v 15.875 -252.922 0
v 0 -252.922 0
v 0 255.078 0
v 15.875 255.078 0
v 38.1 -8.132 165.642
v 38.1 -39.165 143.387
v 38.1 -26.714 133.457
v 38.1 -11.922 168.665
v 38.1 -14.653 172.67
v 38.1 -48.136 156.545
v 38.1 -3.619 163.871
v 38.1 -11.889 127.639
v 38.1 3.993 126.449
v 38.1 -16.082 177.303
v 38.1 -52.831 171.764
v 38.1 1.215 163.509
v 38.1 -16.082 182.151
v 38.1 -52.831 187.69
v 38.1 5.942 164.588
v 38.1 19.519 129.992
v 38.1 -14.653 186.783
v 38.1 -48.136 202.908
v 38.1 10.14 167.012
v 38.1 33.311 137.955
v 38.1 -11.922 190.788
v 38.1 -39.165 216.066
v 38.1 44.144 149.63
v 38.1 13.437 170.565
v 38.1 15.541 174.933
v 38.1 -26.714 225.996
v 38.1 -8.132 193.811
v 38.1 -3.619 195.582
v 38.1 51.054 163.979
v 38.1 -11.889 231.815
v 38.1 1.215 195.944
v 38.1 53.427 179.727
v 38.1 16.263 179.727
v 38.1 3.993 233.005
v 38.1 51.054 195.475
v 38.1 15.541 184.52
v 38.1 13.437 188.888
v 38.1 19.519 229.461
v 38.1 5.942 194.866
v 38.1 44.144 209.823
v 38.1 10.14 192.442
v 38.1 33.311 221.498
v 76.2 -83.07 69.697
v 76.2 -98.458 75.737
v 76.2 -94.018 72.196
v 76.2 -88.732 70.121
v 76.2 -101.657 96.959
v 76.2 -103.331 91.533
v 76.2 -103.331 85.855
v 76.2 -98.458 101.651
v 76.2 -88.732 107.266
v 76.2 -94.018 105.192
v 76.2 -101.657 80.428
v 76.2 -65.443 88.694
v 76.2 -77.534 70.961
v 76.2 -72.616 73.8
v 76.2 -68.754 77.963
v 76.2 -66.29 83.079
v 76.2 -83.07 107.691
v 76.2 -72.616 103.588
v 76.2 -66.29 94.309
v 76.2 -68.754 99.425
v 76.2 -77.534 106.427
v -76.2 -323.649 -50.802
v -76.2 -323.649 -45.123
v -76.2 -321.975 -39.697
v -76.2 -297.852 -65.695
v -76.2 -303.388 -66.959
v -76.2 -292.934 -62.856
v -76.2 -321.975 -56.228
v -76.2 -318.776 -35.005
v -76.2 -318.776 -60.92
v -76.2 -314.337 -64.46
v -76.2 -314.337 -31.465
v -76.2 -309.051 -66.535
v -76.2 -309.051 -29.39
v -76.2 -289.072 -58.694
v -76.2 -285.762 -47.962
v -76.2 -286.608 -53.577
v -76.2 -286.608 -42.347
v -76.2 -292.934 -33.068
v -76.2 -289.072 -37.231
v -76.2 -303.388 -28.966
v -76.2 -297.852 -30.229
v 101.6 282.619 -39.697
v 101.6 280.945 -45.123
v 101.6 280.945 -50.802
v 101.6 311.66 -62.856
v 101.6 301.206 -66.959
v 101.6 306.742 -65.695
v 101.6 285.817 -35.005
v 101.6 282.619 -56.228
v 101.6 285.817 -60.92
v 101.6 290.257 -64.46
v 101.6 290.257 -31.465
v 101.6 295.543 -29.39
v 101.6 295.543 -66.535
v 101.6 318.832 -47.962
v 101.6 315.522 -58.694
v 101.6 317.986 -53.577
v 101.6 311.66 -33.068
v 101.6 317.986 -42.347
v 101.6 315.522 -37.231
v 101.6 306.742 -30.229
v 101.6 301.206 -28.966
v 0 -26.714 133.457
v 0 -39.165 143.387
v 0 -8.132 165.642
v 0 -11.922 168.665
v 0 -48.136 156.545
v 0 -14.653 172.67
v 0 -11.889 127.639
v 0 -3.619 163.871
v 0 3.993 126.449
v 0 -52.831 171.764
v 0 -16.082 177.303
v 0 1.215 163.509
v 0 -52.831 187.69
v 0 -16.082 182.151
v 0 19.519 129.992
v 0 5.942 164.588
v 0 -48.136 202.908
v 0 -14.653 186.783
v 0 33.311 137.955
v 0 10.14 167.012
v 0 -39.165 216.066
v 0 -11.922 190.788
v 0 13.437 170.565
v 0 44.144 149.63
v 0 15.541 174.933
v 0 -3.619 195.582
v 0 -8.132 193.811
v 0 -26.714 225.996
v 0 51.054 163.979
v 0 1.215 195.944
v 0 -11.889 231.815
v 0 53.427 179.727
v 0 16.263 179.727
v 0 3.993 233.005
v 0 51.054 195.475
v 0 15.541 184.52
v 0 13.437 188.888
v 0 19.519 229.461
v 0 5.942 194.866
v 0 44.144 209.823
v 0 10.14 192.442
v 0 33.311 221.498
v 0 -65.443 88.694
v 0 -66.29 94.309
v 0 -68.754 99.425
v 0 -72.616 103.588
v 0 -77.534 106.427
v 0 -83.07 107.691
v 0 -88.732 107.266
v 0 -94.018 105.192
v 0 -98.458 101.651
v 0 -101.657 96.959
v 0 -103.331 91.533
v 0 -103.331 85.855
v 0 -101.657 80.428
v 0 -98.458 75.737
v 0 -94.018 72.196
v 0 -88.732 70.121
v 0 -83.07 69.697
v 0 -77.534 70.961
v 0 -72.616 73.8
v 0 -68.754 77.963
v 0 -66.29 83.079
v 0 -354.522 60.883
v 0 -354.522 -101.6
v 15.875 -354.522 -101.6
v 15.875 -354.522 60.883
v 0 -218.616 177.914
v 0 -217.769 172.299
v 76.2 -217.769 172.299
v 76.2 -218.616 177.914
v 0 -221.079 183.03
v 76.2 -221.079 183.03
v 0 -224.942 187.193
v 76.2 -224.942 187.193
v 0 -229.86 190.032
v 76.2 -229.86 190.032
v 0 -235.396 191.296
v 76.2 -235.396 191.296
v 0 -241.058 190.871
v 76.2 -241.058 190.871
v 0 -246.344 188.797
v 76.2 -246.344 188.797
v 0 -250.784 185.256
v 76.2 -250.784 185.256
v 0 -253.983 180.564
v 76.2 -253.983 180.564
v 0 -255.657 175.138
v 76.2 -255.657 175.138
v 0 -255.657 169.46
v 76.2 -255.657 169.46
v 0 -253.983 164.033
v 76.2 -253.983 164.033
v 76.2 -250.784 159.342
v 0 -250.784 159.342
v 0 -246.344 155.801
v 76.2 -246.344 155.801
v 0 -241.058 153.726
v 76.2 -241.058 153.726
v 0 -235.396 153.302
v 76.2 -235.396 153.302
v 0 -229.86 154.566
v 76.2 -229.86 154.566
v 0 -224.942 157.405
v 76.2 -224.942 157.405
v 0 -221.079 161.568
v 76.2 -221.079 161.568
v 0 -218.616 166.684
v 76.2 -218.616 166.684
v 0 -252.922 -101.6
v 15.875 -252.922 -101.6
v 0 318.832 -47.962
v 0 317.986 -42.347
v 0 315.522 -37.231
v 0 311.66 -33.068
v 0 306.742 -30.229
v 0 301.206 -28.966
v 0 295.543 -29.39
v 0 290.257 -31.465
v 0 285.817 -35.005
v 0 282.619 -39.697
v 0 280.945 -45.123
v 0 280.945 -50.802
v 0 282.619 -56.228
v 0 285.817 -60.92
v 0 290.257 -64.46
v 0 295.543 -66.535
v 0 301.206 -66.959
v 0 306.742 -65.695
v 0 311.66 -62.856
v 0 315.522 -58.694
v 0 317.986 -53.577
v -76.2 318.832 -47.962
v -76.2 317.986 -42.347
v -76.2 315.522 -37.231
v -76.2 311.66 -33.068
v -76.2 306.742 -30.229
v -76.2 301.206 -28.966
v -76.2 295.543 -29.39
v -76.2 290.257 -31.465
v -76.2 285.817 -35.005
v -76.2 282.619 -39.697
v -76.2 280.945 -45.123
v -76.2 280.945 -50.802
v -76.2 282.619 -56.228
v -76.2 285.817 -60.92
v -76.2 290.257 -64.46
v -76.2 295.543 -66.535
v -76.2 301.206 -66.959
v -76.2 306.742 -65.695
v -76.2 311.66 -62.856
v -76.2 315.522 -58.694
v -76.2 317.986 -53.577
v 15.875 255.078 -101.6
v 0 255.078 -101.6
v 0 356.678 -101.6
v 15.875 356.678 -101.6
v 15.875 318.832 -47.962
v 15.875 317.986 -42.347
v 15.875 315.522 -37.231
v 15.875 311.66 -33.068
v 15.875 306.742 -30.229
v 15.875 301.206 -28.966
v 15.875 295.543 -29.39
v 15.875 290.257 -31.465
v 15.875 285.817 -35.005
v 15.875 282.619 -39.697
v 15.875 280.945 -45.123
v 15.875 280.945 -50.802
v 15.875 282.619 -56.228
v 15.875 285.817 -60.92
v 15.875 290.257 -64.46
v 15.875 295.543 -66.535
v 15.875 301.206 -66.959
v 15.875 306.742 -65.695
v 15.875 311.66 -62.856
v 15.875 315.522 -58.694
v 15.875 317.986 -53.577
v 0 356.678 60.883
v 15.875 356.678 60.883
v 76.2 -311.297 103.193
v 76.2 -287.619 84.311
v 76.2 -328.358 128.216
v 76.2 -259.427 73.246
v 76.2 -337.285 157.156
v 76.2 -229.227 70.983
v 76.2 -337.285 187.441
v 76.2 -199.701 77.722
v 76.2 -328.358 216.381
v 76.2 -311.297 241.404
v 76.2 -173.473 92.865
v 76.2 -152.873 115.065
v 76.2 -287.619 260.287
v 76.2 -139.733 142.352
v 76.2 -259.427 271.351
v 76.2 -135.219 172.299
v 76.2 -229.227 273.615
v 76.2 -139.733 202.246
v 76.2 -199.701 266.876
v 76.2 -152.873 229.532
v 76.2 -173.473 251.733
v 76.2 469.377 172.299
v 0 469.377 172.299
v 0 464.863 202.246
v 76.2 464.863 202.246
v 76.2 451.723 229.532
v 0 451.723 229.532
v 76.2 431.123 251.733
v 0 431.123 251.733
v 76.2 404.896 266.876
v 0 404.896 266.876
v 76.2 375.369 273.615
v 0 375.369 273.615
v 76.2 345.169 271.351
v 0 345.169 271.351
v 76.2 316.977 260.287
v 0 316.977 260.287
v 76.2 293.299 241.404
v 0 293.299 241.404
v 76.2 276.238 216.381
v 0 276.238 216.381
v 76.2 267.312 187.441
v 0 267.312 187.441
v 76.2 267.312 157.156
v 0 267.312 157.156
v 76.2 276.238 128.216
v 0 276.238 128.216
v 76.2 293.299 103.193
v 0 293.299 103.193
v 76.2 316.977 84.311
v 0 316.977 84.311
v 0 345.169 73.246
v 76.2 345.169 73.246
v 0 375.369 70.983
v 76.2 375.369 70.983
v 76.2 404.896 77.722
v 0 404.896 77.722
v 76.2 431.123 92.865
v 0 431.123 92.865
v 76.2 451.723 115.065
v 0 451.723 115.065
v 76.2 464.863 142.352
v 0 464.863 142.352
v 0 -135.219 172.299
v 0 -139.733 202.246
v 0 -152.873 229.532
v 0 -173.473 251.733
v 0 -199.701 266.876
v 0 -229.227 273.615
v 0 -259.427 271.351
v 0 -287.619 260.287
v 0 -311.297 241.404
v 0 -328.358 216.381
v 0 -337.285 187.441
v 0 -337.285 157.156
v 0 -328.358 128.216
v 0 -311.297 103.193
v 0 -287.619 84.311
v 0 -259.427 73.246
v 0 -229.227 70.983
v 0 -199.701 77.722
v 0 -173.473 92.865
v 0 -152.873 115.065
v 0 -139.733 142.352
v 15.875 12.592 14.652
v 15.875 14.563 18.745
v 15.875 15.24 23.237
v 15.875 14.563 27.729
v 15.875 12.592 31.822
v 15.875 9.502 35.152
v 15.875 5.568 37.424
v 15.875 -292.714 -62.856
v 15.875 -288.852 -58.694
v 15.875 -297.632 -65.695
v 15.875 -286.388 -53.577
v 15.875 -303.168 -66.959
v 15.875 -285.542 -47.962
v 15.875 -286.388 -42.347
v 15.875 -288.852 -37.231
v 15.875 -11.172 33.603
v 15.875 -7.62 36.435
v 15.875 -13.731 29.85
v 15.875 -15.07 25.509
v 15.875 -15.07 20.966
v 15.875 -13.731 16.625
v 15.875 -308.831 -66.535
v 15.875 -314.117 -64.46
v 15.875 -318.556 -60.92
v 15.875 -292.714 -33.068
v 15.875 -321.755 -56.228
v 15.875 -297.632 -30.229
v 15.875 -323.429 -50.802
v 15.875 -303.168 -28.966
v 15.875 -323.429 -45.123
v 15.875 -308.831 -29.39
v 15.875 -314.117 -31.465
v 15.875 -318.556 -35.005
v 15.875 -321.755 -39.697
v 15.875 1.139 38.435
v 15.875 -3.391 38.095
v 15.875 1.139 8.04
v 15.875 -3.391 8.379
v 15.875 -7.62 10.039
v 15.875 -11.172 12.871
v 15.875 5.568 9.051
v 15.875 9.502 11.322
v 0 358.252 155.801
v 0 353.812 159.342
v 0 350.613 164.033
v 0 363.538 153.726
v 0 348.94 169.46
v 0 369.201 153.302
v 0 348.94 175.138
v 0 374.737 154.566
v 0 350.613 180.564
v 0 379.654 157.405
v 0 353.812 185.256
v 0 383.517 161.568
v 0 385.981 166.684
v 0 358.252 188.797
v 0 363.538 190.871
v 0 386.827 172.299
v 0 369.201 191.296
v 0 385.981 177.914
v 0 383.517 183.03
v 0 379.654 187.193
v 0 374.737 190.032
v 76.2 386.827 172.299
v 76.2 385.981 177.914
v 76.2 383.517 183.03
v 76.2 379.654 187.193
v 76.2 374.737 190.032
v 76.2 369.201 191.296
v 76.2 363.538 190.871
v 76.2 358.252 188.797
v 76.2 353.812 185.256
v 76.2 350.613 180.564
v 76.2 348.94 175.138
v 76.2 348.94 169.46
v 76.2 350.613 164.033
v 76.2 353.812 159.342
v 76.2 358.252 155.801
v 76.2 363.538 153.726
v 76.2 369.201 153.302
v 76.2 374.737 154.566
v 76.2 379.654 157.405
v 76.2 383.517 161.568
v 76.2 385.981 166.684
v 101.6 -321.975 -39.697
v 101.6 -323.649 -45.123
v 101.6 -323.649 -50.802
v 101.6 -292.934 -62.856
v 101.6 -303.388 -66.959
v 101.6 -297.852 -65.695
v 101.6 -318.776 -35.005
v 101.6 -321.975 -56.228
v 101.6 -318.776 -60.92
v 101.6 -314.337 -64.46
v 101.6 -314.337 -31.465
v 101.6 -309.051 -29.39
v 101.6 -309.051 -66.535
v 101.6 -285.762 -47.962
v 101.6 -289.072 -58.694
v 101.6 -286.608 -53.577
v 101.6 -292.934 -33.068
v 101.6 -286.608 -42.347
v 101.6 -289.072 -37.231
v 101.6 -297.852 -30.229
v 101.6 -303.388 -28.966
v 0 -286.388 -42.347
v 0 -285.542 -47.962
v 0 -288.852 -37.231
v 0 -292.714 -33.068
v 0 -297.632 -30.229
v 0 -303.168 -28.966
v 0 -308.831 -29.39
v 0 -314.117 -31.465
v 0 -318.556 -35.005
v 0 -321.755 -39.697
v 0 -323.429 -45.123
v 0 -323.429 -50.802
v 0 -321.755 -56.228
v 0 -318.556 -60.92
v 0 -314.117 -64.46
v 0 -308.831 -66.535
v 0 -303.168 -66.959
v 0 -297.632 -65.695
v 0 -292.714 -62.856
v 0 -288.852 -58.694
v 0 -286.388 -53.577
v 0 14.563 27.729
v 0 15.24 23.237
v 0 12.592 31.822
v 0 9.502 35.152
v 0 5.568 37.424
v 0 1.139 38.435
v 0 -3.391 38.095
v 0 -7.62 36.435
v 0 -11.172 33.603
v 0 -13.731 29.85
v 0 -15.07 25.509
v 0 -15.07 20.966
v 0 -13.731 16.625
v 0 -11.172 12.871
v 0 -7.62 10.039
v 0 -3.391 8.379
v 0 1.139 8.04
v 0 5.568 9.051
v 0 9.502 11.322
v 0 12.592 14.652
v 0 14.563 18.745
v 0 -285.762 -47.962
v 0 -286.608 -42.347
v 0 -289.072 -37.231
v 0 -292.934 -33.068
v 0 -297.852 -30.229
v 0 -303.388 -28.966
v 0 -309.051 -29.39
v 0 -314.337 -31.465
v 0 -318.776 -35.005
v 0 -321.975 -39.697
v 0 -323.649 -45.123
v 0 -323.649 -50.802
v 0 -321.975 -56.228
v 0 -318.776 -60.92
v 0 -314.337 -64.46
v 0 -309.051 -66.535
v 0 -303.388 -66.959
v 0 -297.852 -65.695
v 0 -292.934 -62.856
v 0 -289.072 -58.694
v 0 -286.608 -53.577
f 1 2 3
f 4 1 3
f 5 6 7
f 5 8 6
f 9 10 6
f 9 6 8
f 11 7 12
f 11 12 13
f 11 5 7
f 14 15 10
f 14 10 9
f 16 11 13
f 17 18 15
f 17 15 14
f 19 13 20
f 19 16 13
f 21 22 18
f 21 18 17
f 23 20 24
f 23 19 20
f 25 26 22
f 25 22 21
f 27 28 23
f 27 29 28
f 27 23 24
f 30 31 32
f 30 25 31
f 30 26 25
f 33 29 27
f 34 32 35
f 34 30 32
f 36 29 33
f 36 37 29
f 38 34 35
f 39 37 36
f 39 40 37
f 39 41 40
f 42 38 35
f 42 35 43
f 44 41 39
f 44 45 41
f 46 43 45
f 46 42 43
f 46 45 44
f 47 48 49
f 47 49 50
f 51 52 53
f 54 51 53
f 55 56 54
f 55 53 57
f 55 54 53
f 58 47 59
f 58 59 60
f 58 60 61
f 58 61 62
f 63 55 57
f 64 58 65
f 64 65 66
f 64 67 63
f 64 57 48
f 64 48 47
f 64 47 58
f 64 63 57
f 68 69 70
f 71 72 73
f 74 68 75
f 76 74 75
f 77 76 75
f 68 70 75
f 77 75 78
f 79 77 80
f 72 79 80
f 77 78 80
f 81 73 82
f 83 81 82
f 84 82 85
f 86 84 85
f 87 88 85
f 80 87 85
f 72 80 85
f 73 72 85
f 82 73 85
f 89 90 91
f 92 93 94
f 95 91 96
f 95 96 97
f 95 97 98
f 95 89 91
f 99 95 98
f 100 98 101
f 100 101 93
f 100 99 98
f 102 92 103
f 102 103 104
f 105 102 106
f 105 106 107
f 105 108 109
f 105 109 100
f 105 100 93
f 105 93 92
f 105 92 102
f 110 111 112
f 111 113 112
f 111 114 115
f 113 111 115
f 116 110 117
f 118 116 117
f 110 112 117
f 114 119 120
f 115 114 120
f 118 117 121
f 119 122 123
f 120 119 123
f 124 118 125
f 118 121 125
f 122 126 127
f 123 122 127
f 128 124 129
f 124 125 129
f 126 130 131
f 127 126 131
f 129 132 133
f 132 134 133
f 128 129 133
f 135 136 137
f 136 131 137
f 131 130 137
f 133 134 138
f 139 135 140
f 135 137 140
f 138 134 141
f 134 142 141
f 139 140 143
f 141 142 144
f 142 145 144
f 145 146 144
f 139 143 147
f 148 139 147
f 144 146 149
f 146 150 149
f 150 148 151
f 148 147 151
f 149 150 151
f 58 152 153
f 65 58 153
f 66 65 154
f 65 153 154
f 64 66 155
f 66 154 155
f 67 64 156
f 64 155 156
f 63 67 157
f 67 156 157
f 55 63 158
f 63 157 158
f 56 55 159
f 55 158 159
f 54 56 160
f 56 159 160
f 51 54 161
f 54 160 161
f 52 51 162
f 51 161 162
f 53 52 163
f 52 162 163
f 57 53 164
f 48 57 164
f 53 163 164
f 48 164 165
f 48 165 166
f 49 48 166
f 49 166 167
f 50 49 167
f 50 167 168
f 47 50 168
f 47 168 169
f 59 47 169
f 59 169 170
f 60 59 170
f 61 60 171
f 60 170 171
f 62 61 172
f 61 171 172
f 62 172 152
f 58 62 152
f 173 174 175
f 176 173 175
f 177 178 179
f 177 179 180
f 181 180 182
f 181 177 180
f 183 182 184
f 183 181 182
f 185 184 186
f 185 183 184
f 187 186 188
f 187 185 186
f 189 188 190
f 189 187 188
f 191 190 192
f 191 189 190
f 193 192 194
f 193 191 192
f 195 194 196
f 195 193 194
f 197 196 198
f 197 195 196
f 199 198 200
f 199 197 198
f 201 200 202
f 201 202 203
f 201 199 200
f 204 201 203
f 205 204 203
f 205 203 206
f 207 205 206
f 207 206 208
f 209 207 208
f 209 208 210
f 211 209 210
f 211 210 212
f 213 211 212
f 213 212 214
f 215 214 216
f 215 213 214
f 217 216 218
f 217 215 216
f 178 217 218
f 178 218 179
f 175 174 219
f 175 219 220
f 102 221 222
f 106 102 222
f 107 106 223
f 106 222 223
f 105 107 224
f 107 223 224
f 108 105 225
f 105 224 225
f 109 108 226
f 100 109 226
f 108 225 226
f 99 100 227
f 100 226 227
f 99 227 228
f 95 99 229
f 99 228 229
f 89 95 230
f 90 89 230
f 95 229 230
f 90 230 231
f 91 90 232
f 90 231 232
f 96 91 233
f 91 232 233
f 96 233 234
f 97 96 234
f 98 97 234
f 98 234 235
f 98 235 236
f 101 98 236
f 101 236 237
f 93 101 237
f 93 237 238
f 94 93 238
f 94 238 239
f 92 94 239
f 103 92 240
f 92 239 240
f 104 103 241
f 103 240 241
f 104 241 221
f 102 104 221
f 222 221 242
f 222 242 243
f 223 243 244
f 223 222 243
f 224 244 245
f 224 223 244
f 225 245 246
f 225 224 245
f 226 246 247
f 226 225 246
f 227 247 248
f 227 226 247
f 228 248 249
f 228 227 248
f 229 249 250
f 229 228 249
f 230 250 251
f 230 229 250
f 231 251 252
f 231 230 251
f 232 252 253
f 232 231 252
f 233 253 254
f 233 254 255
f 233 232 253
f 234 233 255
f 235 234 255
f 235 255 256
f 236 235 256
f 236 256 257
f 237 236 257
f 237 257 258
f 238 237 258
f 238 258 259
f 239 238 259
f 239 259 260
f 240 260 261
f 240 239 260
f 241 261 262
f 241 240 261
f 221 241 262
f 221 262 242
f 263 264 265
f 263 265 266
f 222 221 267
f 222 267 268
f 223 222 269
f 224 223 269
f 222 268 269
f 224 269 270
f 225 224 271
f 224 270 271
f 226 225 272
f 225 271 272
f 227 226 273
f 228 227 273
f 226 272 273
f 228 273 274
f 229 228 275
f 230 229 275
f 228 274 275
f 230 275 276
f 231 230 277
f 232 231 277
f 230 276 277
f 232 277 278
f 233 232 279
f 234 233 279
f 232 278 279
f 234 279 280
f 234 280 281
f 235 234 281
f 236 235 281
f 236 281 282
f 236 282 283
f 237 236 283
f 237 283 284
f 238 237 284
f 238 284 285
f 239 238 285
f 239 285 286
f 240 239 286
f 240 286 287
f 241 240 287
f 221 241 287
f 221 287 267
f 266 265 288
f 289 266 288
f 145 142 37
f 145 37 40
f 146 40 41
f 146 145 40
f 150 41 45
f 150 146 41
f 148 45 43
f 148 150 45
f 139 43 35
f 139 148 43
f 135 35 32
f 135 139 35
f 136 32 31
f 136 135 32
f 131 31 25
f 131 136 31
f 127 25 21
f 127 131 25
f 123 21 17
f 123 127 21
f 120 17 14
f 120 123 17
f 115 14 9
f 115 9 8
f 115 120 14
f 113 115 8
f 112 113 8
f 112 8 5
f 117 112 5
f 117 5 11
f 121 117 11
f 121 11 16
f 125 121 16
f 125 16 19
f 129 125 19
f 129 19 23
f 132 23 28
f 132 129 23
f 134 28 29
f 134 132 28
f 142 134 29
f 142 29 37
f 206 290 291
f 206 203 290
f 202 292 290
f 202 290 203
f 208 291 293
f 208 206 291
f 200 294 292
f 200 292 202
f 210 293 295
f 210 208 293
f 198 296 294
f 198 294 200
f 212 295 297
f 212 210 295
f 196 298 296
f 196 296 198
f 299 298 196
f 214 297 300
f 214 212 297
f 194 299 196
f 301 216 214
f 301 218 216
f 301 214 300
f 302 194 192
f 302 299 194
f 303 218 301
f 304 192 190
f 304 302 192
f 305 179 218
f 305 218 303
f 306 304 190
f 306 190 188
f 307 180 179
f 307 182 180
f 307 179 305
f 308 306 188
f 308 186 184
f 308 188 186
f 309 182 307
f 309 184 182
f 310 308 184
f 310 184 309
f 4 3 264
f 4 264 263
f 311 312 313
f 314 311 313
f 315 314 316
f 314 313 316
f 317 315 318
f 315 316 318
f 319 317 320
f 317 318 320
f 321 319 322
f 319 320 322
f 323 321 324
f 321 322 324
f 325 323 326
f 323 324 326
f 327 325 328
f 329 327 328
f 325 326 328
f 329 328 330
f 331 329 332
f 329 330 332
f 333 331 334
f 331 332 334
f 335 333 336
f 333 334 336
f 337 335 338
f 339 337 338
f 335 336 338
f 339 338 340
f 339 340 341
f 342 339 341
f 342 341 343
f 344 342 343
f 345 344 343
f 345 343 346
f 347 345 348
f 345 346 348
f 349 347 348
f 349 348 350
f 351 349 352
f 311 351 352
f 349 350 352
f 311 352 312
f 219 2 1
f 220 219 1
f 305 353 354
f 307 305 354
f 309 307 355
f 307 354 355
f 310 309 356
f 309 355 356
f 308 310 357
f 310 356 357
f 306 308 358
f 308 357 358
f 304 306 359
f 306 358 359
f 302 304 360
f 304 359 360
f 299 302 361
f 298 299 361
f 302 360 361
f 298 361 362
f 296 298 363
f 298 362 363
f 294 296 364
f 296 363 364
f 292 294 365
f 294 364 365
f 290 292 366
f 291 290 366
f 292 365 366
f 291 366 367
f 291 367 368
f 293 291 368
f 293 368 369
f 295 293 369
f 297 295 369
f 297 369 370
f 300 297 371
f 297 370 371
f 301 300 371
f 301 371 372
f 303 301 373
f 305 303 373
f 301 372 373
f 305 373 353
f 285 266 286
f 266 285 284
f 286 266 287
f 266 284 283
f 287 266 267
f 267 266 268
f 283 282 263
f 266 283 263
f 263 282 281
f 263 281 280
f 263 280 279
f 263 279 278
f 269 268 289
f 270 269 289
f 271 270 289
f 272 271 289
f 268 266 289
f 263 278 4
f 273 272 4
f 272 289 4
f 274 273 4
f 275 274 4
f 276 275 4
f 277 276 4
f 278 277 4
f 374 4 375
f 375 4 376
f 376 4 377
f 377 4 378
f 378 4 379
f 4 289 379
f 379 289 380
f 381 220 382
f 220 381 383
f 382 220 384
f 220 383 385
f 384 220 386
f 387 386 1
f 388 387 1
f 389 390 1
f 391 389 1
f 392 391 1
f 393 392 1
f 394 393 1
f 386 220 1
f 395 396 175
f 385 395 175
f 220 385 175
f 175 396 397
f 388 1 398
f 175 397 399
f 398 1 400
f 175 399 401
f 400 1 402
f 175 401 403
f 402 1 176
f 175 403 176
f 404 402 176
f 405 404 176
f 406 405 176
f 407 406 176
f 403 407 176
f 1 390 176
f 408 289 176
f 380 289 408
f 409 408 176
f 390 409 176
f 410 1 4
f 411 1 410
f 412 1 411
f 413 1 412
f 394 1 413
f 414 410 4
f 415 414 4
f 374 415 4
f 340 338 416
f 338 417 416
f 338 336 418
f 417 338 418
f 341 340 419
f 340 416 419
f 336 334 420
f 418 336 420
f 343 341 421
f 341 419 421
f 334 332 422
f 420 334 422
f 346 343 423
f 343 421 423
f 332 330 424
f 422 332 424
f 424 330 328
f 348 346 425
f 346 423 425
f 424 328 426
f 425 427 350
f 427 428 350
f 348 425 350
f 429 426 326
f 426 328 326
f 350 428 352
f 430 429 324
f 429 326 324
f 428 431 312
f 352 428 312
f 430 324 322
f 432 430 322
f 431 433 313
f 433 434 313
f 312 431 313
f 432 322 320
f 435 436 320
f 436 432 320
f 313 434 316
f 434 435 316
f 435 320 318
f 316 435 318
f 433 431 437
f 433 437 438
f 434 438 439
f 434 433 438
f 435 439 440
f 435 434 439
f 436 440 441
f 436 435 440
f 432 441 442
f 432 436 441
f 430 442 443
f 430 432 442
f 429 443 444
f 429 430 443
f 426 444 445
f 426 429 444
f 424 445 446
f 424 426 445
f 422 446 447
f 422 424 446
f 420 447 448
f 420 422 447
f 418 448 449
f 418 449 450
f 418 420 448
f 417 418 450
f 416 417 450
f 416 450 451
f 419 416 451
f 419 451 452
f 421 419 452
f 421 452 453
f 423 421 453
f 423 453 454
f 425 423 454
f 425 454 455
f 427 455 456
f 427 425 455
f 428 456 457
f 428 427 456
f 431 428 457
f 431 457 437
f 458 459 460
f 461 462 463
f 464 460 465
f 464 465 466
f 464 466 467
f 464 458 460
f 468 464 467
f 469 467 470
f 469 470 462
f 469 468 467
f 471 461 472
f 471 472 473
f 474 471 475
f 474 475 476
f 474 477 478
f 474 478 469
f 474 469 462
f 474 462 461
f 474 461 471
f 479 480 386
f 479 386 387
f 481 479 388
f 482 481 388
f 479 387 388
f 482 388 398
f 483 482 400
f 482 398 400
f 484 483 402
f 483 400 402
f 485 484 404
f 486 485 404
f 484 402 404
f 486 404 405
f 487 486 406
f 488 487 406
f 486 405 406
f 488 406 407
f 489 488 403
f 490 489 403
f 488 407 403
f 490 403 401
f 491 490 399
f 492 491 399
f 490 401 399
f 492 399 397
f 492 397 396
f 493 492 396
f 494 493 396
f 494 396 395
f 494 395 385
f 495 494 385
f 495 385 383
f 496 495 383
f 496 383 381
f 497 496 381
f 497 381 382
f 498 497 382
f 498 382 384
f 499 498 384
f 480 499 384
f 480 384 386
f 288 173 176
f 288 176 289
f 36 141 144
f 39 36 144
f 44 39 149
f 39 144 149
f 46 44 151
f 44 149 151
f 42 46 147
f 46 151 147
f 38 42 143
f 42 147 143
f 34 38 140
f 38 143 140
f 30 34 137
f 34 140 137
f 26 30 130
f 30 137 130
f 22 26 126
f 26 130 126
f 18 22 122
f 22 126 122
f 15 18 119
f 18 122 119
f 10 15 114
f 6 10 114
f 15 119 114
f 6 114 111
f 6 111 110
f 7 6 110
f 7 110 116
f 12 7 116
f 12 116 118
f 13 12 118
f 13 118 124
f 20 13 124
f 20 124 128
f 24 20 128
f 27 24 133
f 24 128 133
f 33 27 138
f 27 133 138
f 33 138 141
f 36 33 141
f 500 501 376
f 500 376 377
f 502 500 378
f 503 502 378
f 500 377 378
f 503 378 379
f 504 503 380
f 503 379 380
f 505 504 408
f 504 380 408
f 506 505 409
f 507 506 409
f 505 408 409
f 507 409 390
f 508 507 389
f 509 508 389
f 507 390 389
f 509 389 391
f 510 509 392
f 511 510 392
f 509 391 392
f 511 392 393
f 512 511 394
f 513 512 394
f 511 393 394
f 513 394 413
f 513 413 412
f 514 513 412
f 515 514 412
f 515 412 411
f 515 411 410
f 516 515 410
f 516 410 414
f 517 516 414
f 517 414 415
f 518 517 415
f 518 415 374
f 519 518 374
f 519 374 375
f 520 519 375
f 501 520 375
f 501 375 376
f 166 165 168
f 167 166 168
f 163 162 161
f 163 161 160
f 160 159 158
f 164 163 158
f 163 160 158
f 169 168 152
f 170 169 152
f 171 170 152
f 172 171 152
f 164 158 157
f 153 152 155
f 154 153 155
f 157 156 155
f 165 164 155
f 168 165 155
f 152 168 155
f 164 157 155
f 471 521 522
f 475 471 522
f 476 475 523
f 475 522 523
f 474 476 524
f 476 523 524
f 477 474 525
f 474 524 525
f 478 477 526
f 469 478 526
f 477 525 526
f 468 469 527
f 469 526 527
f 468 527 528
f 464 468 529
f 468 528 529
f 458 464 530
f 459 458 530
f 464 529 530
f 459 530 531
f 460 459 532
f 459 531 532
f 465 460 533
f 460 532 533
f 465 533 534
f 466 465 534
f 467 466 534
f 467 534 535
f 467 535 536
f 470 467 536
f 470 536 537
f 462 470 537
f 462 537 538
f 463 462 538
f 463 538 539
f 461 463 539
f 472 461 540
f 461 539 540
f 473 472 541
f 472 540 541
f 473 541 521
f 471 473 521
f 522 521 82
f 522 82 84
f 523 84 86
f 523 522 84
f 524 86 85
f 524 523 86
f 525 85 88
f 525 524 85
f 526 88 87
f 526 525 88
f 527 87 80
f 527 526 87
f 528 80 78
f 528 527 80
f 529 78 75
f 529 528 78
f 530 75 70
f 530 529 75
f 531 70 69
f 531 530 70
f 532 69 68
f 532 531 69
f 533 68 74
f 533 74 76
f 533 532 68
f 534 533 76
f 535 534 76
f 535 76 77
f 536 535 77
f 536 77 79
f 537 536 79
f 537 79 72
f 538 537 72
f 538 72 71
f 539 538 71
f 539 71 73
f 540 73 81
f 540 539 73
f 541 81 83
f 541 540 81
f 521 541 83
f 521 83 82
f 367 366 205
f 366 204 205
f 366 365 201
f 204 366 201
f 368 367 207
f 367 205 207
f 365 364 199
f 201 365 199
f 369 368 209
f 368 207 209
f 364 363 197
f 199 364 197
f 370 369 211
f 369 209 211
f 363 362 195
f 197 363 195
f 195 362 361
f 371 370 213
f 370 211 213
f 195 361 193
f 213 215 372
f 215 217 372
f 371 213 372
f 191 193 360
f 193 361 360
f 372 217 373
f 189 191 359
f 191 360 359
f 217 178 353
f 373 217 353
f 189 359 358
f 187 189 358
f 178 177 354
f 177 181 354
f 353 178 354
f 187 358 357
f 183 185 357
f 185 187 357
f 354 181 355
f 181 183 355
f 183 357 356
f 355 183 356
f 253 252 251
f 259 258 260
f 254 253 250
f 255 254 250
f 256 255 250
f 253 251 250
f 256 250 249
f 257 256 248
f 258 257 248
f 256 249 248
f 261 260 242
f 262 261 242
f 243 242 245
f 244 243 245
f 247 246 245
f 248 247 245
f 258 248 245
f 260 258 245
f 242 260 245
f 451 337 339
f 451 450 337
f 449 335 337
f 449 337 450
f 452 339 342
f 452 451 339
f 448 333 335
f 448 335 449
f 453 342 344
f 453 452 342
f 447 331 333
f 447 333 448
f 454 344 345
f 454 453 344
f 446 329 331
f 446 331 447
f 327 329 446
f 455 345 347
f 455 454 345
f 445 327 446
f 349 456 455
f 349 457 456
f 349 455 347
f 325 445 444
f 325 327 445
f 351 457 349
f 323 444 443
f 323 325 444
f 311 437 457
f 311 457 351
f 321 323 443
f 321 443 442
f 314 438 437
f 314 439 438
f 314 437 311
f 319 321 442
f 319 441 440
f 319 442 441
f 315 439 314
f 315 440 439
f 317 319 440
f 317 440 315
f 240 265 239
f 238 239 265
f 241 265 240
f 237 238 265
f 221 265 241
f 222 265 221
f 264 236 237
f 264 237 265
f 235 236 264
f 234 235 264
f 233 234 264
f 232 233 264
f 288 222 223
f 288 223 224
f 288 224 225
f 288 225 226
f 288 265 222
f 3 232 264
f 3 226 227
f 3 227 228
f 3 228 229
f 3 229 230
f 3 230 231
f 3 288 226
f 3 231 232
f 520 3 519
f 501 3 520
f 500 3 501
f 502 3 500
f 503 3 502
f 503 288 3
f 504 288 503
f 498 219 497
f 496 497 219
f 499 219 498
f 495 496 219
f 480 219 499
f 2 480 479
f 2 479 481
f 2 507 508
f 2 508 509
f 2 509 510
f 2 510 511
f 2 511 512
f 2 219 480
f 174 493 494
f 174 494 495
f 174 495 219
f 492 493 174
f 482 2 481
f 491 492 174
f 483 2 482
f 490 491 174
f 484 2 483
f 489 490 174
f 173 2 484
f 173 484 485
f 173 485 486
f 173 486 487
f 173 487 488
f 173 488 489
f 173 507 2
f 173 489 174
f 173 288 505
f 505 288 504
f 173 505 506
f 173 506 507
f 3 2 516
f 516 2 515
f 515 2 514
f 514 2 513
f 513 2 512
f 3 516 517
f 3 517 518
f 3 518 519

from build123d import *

# Parameters (mm, degrees)
F0_W          = 711.2
F0_H          = 60.8830283012
F1_DEPTH      = 15.875
F2_W          = 15.875
F2_H          = 101.6
F3_DEPTH      = 101.6
F4_R          = 15.24
F5_DEPTH      = 15.876
F6_R          = 19.05
F7_DEPTH      = 15.876
F8_R          = 19.05
F9_DEPTH      = 76.2
F9_DEPTH_BACK = 101.6
F10_R         = 101.6
F10_R_2       = 19.05
F11_DEPTH     = 76.2
F12_R         = 53.427441811
F12_R_2       = 16.2632160737
F13_DEPTH     = 38.1
F14_R         = 19.05
F15_DEPTH     = 76.2


with BuildPart() as f1:
    # F0 (on Right) → F1 (new body)
    with BuildSketch(Plane.YZ):
        with Locations((1.0775724914, 30.4415141506)):
            Rectangle(F0_W, F0_H)
    extrude(amount=F1_DEPTH)

    # F2 (on face) → F3 (join)
    with BuildSketch(Plane(origin=(0, 0, 0), x_dir=(1, 0, 0), z_dir=(0, 0, -1))):
        with Locations((7.9375, 303.7224275086)):
            Rectangle(F2_W, F2_H)
        with Locations((7.9375, -305.8775724914)):
            Rectangle(F2_W, F2_H)
    extrude(amount=F3_DEPTH)

    # F4 (on face) → F5 (cut, through all)
    with BuildSketch(Plane.YZ.offset(15.875)):
        with Locations((0, 23.2371634206)):
            Circle(F4_R)
    extrude(amount=-F5_DEPTH, mode=Mode.SUBTRACT)

    # F6 (on face) → F7 (cut, through all)
    with BuildSketch(Plane.YZ.offset(15.875)):
        with Locations((-304.5917153358, -47.9623302817)):
            Circle(F6_R)
        with Locations((299.7820846642, -47.9623302817)):
            Circle(F6_R)
    extrude(amount=-F7_DEPTH, mode=Mode.SUBTRACT)


with BuildPart() as f9:
    # F8 (on Right) → F9 (new body, two sides)
    with BuildSketch(Plane.YZ) as f9_sk:
        with Locations((299.7820846642, -47.9623302817)):
            Circle(F8_R)
    extrude(amount=-F9_DEPTH)
    extrude(f9_sk.sketch, amount=F9_DEPTH_BACK)


with BuildPart() as f9b:
    # F8 (on Right) → F9, piece 2 (new body, two sides)
    with BuildSketch(Plane.YZ) as f9_2_sk:
        with Locations((-304.8117753358, -47.9623302817)):
            Circle(F8_R)
    extrude(amount=-F9_DEPTH)
    extrude(f9_2_sk.sketch, amount=F9_DEPTH_BACK)


with BuildPart() as f11:
    # F10 (on Right) → F11 (new body)
    with BuildSketch(Plane.YZ):
        with Locations((-236.8192970753, 172.2988039255)):
            Circle(F10_R)
        with Locations((-236.8192970753, 172.2988039255)):
            Circle(F10_R_2, mode=Mode.SUBTRACT)
    extrude(amount=F11_DEPTH)


with BuildPart() as f11b:
    # F10 (on Right) → F11, piece 2 (new body)
    with BuildSketch(Plane.YZ):
        with Locations((367.7769029247, 172.2988039255)):
            Circle(F10_R)
        with Locations((367.7769029247, 172.2988039255)):
            Circle(F10_R_2, mode=Mode.SUBTRACT)
    extrude(amount=F11_DEPTH)


with BuildPart() as f13:
    # F12 (on Right) → F13 (new body)
    with BuildSketch(Plane.YZ):
        with Locations((0, 179.726600647)):
            Circle(F12_R)
        with Locations((0, 179.726600647)):
            Circle(F12_R_2, mode=Mode.SUBTRACT)
    extrude(amount=F13_DEPTH)


with BuildPart() as f15:
    # F14 (on Right) → F15 (new body)
    with BuildSketch(Plane.YZ):
        with Locations((-84.4934731722, 88.6937975883)):
            Circle(F14_R)
    extrude(amount=F15_DEPTH)


solid = Compound([f1.part, f9.part, f9b.part, f11.part, f11b.part, f13.part, f15.part])
